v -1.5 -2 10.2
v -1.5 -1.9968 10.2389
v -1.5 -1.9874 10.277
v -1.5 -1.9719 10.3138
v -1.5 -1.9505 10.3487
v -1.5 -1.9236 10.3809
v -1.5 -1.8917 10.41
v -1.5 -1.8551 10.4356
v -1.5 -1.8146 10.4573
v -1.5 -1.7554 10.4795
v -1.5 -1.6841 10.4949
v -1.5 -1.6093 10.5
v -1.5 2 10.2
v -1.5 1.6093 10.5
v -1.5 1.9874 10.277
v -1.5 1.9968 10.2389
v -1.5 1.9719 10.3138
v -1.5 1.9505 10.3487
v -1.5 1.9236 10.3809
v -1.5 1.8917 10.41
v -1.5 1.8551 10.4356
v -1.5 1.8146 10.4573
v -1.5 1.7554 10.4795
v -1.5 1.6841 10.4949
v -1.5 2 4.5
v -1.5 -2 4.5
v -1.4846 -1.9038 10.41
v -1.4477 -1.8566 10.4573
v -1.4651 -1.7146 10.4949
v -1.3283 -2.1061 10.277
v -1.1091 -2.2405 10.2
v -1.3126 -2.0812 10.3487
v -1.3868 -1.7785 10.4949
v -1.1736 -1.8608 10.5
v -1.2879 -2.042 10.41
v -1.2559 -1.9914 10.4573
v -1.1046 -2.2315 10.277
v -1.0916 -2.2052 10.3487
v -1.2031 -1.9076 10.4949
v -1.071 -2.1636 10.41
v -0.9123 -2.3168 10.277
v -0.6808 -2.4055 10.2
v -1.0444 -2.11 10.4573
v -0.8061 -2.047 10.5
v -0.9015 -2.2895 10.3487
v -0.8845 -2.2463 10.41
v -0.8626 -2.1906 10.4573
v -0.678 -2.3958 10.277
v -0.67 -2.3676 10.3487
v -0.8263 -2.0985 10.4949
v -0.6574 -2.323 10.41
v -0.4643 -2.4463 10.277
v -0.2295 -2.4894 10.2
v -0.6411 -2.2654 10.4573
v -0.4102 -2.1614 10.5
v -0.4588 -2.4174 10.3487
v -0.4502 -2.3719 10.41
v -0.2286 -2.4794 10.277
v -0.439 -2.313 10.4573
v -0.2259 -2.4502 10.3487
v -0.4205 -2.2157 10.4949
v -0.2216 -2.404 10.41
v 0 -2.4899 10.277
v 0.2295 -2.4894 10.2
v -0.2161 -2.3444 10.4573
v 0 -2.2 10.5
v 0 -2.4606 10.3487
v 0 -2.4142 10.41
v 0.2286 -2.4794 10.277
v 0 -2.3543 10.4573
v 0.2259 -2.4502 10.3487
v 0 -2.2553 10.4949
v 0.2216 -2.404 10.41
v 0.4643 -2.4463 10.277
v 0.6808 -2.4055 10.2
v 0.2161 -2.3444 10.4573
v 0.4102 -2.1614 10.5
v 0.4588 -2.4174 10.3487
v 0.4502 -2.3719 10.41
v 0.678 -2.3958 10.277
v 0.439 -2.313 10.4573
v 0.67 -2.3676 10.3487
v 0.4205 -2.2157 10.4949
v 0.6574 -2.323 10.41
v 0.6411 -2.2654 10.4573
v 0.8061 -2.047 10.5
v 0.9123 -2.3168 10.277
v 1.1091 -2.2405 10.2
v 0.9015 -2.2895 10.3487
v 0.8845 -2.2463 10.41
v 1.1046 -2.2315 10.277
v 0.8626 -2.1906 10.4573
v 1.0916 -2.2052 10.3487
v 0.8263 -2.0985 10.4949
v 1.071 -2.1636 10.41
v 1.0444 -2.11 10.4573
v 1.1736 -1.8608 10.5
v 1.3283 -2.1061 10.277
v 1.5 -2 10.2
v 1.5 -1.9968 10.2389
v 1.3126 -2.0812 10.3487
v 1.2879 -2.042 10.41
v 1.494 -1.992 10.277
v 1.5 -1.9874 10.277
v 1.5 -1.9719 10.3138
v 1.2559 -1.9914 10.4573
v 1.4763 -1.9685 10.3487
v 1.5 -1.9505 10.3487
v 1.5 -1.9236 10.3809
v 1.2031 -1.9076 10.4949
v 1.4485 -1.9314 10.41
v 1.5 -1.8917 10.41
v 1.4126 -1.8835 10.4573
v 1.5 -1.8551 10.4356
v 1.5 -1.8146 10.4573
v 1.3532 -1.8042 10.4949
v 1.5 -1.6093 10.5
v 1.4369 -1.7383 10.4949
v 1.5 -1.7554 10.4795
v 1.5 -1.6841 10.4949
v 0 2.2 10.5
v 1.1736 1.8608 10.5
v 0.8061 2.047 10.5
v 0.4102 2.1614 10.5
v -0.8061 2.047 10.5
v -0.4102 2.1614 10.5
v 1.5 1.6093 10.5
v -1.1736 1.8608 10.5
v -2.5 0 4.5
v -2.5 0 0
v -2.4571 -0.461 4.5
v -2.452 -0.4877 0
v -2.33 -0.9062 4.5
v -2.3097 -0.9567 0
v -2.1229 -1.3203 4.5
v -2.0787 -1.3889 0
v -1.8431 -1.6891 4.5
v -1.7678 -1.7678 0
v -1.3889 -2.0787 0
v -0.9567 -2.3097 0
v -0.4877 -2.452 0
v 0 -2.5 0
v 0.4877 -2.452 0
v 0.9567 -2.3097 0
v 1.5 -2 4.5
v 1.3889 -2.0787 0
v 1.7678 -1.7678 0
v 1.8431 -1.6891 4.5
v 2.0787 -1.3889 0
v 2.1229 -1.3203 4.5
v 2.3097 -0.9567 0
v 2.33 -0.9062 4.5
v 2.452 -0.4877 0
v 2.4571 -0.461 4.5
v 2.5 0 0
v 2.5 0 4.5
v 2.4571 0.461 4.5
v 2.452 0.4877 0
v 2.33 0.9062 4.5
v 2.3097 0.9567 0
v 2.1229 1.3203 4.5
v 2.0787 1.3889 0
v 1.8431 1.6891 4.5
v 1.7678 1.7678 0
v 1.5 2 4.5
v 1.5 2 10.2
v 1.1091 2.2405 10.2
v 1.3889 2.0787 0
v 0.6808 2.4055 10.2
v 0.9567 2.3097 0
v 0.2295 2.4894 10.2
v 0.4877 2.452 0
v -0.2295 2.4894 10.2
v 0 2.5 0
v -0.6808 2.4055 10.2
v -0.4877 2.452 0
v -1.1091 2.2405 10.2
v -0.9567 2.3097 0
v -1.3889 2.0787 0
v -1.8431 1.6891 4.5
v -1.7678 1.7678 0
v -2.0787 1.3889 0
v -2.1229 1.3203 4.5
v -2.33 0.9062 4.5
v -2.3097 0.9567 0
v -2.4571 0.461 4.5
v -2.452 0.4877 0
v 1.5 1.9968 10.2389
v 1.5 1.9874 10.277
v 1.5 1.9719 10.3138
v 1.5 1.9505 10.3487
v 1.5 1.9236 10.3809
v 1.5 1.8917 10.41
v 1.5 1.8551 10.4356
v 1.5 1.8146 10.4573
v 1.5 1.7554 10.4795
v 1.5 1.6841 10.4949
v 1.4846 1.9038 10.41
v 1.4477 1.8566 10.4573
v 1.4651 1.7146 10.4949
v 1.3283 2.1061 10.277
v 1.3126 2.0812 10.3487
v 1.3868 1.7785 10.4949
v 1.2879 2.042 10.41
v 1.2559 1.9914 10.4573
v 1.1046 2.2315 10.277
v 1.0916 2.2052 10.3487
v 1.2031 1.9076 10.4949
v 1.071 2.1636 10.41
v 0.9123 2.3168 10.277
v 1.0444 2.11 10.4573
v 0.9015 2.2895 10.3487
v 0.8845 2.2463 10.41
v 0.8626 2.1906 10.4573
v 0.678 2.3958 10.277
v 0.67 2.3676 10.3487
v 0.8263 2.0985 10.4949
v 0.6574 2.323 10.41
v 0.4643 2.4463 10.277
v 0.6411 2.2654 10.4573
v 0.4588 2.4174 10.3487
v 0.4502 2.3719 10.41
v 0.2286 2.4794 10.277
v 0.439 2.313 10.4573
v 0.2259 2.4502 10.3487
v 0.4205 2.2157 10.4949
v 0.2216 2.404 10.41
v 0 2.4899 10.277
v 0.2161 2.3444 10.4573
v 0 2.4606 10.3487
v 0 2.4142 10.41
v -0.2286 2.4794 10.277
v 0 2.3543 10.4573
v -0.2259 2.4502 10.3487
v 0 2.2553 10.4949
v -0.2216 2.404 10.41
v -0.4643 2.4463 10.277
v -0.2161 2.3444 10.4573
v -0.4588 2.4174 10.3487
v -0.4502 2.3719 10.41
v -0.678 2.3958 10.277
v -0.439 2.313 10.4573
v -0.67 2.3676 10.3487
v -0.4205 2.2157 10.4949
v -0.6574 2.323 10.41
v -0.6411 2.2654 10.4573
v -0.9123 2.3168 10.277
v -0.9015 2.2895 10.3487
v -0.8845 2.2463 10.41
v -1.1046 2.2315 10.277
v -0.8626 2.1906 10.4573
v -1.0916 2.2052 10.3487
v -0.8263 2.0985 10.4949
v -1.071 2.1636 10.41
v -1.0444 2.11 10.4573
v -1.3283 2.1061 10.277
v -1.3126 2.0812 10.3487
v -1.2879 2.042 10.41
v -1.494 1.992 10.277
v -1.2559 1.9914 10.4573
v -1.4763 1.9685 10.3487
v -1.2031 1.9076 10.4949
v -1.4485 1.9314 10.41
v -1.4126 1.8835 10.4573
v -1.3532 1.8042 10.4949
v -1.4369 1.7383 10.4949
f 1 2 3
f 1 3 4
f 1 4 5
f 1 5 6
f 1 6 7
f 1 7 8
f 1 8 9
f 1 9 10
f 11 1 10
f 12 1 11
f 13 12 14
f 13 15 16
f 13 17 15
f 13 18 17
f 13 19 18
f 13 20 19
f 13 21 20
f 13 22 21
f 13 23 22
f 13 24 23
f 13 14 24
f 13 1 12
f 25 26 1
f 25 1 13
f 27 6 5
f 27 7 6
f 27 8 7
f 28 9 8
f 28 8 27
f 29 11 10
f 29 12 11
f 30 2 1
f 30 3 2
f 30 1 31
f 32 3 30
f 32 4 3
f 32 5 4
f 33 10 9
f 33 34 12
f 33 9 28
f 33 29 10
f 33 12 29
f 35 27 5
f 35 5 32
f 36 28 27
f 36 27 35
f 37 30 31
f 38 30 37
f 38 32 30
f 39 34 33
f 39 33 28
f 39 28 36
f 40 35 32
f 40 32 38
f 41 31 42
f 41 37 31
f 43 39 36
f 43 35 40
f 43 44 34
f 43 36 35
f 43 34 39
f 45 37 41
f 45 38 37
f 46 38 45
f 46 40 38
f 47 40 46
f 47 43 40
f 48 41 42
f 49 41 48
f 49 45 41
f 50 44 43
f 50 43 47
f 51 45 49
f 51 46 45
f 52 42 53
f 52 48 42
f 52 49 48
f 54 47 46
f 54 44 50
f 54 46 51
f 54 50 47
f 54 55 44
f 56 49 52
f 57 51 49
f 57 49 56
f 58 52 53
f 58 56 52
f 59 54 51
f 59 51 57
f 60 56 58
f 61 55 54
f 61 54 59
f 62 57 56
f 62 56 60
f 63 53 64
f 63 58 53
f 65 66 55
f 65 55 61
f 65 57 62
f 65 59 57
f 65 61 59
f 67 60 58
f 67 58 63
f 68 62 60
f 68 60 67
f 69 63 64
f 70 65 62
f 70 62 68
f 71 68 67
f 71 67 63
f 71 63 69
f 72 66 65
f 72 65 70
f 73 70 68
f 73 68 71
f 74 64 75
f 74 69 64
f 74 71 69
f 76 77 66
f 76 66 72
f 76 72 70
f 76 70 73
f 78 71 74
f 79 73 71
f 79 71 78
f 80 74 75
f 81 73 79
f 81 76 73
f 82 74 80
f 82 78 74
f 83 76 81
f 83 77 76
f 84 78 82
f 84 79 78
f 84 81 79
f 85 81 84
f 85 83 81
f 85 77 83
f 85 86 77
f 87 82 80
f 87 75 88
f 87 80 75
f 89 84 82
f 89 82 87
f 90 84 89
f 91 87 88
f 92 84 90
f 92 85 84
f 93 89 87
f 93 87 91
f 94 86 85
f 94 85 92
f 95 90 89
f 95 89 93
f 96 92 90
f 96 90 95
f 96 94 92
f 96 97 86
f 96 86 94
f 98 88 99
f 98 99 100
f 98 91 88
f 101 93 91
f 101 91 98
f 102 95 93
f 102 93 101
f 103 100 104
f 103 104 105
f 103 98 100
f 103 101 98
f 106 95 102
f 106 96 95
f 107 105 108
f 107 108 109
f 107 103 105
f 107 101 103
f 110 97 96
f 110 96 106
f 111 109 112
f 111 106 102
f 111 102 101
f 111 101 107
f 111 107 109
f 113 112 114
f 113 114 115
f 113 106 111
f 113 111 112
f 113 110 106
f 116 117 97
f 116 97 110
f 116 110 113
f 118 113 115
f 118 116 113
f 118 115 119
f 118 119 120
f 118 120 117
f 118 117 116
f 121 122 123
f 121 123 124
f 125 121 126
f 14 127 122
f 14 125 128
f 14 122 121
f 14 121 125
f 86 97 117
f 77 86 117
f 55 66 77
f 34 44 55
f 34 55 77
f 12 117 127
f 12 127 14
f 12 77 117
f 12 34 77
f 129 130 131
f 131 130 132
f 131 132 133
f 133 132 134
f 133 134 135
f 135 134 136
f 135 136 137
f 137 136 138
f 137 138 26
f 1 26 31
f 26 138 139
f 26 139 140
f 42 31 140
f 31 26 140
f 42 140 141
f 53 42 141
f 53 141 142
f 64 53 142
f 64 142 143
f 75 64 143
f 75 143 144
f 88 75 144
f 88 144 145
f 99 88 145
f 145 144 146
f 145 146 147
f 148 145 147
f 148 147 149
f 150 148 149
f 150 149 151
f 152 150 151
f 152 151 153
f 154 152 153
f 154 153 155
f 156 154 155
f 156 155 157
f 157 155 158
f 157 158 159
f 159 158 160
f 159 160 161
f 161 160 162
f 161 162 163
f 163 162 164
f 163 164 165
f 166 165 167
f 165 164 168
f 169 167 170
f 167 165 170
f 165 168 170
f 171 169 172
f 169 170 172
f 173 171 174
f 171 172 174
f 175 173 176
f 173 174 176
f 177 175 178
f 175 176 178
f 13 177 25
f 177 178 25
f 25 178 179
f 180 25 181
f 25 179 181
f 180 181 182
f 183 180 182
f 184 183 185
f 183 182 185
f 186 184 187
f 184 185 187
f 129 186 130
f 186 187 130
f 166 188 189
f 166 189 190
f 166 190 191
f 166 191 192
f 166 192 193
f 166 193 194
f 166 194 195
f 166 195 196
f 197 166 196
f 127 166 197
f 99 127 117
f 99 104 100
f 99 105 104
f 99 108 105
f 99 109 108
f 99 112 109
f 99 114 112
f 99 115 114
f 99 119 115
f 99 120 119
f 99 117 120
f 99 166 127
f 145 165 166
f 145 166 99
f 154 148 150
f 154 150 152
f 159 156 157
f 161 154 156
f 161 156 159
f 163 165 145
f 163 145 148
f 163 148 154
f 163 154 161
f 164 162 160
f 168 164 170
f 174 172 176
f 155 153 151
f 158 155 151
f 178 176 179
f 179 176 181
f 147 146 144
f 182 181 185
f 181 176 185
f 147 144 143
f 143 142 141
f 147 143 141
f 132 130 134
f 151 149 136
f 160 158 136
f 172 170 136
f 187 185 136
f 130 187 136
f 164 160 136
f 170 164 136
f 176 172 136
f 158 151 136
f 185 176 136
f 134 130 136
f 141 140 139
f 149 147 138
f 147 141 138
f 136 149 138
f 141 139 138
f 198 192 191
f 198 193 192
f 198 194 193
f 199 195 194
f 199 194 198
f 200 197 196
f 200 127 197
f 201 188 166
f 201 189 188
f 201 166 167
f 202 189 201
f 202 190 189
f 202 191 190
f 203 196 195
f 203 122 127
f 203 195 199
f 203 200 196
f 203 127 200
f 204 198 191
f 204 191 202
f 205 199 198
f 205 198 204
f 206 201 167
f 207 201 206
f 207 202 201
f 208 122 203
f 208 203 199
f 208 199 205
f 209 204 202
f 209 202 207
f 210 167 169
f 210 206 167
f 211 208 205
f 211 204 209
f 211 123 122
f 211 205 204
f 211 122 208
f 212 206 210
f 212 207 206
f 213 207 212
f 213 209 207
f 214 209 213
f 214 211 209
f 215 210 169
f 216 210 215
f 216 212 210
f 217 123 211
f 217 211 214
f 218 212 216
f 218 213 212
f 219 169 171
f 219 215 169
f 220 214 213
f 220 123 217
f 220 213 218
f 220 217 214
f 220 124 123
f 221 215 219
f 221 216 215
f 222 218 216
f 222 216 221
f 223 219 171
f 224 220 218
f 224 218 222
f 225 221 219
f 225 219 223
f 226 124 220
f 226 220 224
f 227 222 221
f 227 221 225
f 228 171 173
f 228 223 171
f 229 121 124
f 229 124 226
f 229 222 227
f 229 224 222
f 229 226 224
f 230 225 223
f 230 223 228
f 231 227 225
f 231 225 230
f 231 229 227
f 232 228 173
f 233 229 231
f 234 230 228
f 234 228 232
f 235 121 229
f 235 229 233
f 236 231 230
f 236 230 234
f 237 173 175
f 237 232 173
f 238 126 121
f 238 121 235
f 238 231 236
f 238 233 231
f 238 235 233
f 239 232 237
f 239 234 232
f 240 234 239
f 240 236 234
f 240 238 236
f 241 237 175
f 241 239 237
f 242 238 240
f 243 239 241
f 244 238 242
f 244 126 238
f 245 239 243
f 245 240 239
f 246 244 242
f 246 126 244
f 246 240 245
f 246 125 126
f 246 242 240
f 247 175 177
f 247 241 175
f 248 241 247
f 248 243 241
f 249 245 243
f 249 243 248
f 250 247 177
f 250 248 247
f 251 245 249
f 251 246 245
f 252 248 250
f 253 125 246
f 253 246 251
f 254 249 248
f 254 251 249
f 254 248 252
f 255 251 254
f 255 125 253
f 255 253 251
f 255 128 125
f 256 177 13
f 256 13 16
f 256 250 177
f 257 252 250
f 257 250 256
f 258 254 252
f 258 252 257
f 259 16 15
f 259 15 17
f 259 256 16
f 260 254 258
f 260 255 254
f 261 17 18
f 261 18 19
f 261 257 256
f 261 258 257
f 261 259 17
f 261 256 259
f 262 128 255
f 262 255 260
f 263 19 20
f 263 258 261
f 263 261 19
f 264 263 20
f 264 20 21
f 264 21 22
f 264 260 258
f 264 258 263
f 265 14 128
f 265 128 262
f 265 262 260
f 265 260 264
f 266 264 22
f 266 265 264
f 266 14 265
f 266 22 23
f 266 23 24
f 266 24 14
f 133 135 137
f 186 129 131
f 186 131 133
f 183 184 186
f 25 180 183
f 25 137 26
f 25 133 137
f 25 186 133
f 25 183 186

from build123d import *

# Parameters (mm, degrees)
ESQUISSE1_R             = 2.5
BOSS_EXTRU_1_DEPTH      = 10.5
ENL_V_START             = -6
ENL_V_MAT_EXTRU_2_DEPTH = 6
CONG_1_R                = 0.3


with BuildPart() as part:
    # Esquisse1 → Boss.-Extru.1 (new body)
    with BuildSketch(Plane.XY):
        with Locations(Location((0, 0, 0), (0, 0, 180))):
            Circle(ESQUISSE1_R)
    extrude(amount=BOSS_EXTRU_1_DEPTH)

    # Esquisse3 → Enlèv. mat.-Extru.2 (cut)
    with BuildSketch(Plane.XY.offset(10.5).offset(ENL_V_START)):
        with BuildLine():
            Line((1.5, 2), (1.5, -2))
            ThreePointArc((1.5, -2), (2.5, 0), (1.5, 2))
        make_face()
        with BuildLine():
            Line((-1.5, -2), (-1.5, 2))
            ThreePointArc((-1.5, 2), (-2.5, 0), (-1.5, -2))
        make_face()
    extrude(amount=ENL_V_MAT_EXTRU_2_DEPTH, mode=Mode.SUBTRACT)

    # Congé1
    cong_1_edges = [part.edges().sort_by_distance(p)[0] for p in [
        (0, 2.5, 10.5),
        (0, -2.5, 10.5),
    ]]
    fillet(cong_1_edges, radius=CONG_1_R)


solid = part.part
